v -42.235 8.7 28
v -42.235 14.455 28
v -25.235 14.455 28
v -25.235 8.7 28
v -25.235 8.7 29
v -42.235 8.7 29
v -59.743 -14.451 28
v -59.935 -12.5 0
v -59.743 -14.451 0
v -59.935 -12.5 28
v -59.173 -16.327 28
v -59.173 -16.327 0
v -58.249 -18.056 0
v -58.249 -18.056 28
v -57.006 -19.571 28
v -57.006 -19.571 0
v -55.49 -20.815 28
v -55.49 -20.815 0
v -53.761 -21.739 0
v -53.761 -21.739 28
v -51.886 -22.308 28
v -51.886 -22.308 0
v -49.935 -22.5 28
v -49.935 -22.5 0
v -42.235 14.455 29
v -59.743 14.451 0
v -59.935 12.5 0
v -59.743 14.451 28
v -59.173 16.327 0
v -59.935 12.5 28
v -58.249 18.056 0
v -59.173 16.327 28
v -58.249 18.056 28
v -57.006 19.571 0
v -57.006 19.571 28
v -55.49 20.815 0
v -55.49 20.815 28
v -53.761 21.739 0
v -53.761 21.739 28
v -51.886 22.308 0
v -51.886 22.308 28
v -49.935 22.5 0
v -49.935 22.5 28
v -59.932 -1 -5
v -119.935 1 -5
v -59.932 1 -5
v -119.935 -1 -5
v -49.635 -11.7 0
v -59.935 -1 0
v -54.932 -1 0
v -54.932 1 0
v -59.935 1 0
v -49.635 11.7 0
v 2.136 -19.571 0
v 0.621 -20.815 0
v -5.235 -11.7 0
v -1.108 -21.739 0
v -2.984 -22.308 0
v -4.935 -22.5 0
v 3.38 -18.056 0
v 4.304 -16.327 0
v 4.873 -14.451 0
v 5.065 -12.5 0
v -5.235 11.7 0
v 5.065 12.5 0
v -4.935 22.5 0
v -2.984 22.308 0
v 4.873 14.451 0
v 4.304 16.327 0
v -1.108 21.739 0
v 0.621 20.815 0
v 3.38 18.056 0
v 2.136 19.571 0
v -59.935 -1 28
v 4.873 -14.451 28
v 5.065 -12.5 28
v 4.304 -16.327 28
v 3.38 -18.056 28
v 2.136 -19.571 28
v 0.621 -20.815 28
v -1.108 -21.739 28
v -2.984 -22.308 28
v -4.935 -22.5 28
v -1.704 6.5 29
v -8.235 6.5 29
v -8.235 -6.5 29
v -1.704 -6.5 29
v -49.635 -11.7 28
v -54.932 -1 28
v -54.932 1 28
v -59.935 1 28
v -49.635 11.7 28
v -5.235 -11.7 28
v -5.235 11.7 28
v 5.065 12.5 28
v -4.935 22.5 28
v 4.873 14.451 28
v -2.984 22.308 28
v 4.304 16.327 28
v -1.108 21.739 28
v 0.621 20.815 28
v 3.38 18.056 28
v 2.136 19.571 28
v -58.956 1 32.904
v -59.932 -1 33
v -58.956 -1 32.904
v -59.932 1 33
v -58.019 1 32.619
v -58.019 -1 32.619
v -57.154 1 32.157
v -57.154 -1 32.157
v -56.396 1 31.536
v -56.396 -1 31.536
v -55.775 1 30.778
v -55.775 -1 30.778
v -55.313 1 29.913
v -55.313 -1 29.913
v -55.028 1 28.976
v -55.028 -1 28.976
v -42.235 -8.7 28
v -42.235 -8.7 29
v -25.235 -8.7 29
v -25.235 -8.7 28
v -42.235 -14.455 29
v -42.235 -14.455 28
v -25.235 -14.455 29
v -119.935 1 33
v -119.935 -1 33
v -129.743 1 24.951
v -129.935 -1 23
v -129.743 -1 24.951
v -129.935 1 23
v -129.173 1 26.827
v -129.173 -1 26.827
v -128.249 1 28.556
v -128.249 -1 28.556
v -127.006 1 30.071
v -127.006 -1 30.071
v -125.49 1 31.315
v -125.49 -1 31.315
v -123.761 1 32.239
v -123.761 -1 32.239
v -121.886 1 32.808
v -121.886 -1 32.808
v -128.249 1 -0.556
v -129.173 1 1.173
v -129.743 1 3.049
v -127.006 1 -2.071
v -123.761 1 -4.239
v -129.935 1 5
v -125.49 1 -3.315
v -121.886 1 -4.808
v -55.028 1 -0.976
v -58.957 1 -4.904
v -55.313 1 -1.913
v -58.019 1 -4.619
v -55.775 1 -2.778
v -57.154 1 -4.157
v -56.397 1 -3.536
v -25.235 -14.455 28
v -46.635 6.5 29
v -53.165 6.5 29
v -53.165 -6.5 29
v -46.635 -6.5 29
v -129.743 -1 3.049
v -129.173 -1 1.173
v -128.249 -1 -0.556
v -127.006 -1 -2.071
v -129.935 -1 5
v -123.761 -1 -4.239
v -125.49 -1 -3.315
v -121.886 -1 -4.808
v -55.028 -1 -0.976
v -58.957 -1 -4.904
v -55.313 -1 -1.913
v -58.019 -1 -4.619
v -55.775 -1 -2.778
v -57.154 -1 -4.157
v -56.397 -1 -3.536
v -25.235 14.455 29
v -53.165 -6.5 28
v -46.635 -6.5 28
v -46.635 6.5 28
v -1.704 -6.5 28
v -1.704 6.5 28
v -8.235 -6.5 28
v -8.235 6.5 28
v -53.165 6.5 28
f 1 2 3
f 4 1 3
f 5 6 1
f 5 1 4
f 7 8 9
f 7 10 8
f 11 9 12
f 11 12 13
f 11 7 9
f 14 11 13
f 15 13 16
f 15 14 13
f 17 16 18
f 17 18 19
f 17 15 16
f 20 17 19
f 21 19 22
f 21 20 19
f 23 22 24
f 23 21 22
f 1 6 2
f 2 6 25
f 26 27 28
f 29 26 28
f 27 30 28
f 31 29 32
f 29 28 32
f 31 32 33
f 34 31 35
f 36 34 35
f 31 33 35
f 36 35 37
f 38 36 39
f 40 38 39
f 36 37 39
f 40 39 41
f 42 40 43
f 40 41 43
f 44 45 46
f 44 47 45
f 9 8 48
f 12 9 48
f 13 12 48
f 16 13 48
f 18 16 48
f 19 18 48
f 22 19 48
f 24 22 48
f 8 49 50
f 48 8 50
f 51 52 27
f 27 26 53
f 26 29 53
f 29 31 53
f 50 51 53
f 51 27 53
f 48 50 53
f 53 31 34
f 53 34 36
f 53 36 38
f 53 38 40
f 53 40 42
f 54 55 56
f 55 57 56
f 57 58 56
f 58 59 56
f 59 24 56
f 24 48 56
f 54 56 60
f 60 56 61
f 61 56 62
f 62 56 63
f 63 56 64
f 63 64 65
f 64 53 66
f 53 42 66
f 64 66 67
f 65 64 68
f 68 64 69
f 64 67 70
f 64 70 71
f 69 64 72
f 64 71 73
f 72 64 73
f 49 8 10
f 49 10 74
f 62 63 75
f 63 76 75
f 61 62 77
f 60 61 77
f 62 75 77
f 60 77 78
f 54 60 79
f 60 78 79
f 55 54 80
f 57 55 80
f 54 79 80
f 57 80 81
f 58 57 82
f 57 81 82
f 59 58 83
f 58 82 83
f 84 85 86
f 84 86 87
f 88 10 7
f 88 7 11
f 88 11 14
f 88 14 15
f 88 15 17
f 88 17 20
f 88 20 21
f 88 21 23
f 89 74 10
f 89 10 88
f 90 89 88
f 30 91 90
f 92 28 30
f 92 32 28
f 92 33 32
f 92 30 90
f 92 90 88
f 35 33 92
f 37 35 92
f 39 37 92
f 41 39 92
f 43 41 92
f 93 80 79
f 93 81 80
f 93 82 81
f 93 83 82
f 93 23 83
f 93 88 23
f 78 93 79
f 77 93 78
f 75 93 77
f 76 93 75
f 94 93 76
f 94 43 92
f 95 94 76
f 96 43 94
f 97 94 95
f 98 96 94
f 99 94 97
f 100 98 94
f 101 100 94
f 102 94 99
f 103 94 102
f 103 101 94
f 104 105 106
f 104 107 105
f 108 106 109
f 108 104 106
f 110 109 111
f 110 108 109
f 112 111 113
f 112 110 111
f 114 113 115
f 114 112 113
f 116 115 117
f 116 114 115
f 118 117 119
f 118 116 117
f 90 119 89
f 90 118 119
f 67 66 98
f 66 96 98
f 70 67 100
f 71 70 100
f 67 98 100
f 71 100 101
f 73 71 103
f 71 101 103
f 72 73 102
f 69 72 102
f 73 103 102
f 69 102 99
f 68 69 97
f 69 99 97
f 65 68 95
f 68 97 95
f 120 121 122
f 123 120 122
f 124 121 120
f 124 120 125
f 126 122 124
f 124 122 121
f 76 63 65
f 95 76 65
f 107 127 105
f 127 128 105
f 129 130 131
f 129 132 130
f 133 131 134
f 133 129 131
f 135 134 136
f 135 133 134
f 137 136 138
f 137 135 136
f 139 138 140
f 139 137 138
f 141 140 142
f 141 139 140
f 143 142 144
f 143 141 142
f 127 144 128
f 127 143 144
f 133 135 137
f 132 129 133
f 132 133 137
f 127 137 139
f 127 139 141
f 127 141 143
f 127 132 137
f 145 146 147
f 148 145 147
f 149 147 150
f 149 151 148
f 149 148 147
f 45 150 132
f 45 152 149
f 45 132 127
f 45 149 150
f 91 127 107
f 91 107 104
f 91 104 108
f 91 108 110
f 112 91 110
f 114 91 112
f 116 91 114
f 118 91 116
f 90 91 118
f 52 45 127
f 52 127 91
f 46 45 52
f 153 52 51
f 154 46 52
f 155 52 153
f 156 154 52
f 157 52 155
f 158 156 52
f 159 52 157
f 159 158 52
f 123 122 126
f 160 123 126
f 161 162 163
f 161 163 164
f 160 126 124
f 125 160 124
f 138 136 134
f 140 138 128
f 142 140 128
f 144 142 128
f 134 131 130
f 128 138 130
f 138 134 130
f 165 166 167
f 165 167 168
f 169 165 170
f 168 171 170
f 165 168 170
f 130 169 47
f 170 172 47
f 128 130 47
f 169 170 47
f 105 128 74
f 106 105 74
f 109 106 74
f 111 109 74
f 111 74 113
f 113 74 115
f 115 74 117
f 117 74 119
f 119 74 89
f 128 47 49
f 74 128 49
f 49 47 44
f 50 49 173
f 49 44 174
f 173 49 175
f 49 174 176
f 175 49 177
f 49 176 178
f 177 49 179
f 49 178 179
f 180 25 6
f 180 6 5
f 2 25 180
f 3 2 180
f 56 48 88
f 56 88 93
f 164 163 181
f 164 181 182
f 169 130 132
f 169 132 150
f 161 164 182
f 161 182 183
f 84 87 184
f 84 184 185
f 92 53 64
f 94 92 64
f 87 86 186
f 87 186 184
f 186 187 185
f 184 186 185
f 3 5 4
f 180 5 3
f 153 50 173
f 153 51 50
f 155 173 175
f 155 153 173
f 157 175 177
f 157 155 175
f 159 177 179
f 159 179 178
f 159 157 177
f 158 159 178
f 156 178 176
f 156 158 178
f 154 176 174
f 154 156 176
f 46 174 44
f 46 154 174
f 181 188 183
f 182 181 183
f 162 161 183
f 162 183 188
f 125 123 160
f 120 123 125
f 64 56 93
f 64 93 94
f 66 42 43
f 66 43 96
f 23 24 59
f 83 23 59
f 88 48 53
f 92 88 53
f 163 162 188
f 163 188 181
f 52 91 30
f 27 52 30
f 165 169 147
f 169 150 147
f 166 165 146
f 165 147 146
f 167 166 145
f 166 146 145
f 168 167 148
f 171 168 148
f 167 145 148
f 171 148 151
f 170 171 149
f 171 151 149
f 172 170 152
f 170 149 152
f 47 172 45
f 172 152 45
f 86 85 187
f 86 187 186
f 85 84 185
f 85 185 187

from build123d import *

# Parameters (mm, degrees)
SKETCH_1_W           = 65
SKETCH_1_H           = 45
EXTRUDE_1_DEPTH      = 28
SKETCH_2_W           = 44.4
SKETCH_2_H           = 23.4
CUT_EXTRUDE_1_DEPTH  = 39
FILLET_1_R           = 10
FILLET_2_R           = 10
FILLET_3_R           = 10
FILLET_4_R           = 10
EXTRUDE_6_DEPTH      = 1
EXTRUDE_6_2_DEPTH    = 1
EXTRUDE_6_3_DEPTH    = 1
SKETCH_10_W          = 17
SKETCH_10_H          = 5.754584259
EXTRUDE_6_4_DEPTH    = 1
SKETCH_20_W          = 5.002637397
SKETCH_20_H          = 2
EXTRUDE_7_DEPTH      = 5
SKETCH_21_W          = 5.00232547
SKETCH_21_H          = 2
EXTRUDE_8_DEPTH      = 5
EXTRUDE_9_DEPTH      = 1
EXTRUDE_9_DEPTH_BACK = 1
SKETCH_22_W          = 70
SKETCH_22_H          = 38
FILLET_5_R           = 5
FILLET_6_R           = 5
FILLET_7_R           = 10
FILLET_8_R           = 10


with BuildPart() as part:
    # 草圖1 → 填料-伸長1 (new body)
    with BuildSketch(Plane.XY):
        with Locations((-27.434655272, 0)):
            Rectangle(SKETCH_1_W, SKETCH_1_H)
    extrude(amount=EXTRUDE_1_DEPTH)

    # 草圖2 → 除料-伸長1 (cut)
    with BuildSketch(Plane.XY):
        with Locations((-27.434655272, 0)):
            Rectangle(SKETCH_2_W, SKETCH_2_H)
    extrude(amount=CUT_EXTRUDE_1_DEPTH, mode=Mode.SUBTRACT)

    # 圓角1
    fillet_1_edges = [part.edges().sort_by_distance(p)[0] for p in [
        (-59.934655272, -22.5, 14),
    ]]
    fillet(fillet_1_edges, radius=FILLET_1_R)

    # 圓角2
    fillet_2_edges = [part.edges().sort_by_distance(p)[0] for p in [
        (-59.934655272, 22.5, 14),
    ]]
    fillet(fillet_2_edges, radius=FILLET_2_R)

    # 圓角3
    fillet_3_edges = [part.edges().sort_by_distance(p)[0] for p in [
        (5.065344728, 22.5, 14),
    ]]
    fillet(fillet_3_edges, radius=FILLET_3_R)

    # 圓角4
    fillet_4_edges = [part.edges().sort_by_distance(p)[0] for p in [
        (5.065344728, -22.5, 14),
    ]]
    fillet(fillet_4_edges, radius=FILLET_4_R)

    # 草圖20 → 填料-伸長7 (add)
    with BuildSketch(Plane.XY.offset(28)):
        with Locations((-57.433336574, 0)):
            Rectangle(SKETCH_20_W, SKETCH_20_H)
    extrude(amount=EXTRUDE_7_DEPTH)

    # 草圖21 → 填料-伸長8 (add)
    with BuildSketch(Plane(origin=(0, 0, 0), x_dir=(-1, 0, 0), z_dir=(0, 0, -1))):
        with Locations((57.433492537, 0)):
            Rectangle(SKETCH_21_W, SKETCH_21_H)
    extrude(amount=EXTRUDE_8_DEPTH)

    # 草圖22 → 填料-伸長9 (add, two sides: drawn at the far end of the back side and taken through both)
    with BuildSketch(Plane(origin=(0, 0, 0), x_dir=(1, 0, 0), z_dir=(0, 1, 0)).offset(-EXTRUDE_9_DEPTH_BACK)):
        with Locations((-94.934655272, -14)):
            Rectangle(SKETCH_22_W, SKETCH_22_H)
    extrude(amount=EXTRUDE_9_DEPTH + EXTRUDE_9_DEPTH_BACK)

    # 圓角5
    fillet_5_edges = [part.edges().sort_by_distance(p)[0] for p in [
        (-54.932329802, 0, -5),
    ]]
    fillet(fillet_5_edges, radius=FILLET_5_R - 0.0001)  # a hair under: the kernel refuses the full size

    # 圓角6
    fillet_6_edges = [part.edges().sort_by_distance(p)[0] for p in [
        (-54.932017875, 0, 33),
    ]]
    fillet(fillet_6_edges, radius=FILLET_6_R - 0.0001)  # a hair under: the kernel refuses the full size

    # 圓角7
    fillet_7_edges = [part.edges().sort_by_distance(p)[0] for p in [
        (-129.934655272, 0, -5),
    ]]
    fillet(fillet_7_edges, radius=FILLET_7_R)

    # 圓角8
    fillet_8_edges = [part.edges().sort_by_distance(p)[0] for p in [
        (-129.934655272, 0, 33),
    ]]
    fillet(fillet_8_edges, radius=FILLET_8_R)


with BuildPart() as body_2:
    # 草圖10 → 填料-伸長6 (new body)
    with BuildSketch(Plane.XY.offset(29)):
        Polygon((-49.634655272, 6.5), (-53.165057103, 6.5), (-53.165057103, -6.5), (-46.634655272, -6.5), (-46.634655272, 6.5), align=None)
    extrude(amount=-EXTRUDE_6_DEPTH)


with BuildPart() as body_3:
    # 草圖10 → Extrude 6 2 (new body)
    with BuildSketch(Plane.XY.offset(29)):
        Polygon((-42.234655272, -11.7), (-42.234655272, -8.7), (-25.234655272, -8.7), (-25.234655272, -14.454584259), (-42.234655272, -14.454584259), align=None)
    extrude(amount=-EXTRUDE_6_2_DEPTH)


with BuildPart() as body_4:
    # 草圖10 → Extrude 6 3 (new body)
    with BuildSketch(Plane.XY.offset(29)):
        Polygon((-8.234655272, 6.5), (-8.234655272, -6.5), (-5.234655272, -6.5), (-1.70425344, -6.5), (-1.70425344, 6.5), align=None)
    extrude(amount=-EXTRUDE_6_3_DEPTH)


with BuildPart() as body_5:
    # 草圖10 → Extrude 6 4 (new body)
    with BuildSketch(Plane.XY.offset(29)):
        with Locations((-33.734655272, 11.57729213)):
            Rectangle(SKETCH_10_W, SKETCH_10_H)
    extrude(amount=-EXTRUDE_6_4_DEPTH)


solid = Compound([part.part, body_2.part, body_3.part, body_4.part, body_5.part])
